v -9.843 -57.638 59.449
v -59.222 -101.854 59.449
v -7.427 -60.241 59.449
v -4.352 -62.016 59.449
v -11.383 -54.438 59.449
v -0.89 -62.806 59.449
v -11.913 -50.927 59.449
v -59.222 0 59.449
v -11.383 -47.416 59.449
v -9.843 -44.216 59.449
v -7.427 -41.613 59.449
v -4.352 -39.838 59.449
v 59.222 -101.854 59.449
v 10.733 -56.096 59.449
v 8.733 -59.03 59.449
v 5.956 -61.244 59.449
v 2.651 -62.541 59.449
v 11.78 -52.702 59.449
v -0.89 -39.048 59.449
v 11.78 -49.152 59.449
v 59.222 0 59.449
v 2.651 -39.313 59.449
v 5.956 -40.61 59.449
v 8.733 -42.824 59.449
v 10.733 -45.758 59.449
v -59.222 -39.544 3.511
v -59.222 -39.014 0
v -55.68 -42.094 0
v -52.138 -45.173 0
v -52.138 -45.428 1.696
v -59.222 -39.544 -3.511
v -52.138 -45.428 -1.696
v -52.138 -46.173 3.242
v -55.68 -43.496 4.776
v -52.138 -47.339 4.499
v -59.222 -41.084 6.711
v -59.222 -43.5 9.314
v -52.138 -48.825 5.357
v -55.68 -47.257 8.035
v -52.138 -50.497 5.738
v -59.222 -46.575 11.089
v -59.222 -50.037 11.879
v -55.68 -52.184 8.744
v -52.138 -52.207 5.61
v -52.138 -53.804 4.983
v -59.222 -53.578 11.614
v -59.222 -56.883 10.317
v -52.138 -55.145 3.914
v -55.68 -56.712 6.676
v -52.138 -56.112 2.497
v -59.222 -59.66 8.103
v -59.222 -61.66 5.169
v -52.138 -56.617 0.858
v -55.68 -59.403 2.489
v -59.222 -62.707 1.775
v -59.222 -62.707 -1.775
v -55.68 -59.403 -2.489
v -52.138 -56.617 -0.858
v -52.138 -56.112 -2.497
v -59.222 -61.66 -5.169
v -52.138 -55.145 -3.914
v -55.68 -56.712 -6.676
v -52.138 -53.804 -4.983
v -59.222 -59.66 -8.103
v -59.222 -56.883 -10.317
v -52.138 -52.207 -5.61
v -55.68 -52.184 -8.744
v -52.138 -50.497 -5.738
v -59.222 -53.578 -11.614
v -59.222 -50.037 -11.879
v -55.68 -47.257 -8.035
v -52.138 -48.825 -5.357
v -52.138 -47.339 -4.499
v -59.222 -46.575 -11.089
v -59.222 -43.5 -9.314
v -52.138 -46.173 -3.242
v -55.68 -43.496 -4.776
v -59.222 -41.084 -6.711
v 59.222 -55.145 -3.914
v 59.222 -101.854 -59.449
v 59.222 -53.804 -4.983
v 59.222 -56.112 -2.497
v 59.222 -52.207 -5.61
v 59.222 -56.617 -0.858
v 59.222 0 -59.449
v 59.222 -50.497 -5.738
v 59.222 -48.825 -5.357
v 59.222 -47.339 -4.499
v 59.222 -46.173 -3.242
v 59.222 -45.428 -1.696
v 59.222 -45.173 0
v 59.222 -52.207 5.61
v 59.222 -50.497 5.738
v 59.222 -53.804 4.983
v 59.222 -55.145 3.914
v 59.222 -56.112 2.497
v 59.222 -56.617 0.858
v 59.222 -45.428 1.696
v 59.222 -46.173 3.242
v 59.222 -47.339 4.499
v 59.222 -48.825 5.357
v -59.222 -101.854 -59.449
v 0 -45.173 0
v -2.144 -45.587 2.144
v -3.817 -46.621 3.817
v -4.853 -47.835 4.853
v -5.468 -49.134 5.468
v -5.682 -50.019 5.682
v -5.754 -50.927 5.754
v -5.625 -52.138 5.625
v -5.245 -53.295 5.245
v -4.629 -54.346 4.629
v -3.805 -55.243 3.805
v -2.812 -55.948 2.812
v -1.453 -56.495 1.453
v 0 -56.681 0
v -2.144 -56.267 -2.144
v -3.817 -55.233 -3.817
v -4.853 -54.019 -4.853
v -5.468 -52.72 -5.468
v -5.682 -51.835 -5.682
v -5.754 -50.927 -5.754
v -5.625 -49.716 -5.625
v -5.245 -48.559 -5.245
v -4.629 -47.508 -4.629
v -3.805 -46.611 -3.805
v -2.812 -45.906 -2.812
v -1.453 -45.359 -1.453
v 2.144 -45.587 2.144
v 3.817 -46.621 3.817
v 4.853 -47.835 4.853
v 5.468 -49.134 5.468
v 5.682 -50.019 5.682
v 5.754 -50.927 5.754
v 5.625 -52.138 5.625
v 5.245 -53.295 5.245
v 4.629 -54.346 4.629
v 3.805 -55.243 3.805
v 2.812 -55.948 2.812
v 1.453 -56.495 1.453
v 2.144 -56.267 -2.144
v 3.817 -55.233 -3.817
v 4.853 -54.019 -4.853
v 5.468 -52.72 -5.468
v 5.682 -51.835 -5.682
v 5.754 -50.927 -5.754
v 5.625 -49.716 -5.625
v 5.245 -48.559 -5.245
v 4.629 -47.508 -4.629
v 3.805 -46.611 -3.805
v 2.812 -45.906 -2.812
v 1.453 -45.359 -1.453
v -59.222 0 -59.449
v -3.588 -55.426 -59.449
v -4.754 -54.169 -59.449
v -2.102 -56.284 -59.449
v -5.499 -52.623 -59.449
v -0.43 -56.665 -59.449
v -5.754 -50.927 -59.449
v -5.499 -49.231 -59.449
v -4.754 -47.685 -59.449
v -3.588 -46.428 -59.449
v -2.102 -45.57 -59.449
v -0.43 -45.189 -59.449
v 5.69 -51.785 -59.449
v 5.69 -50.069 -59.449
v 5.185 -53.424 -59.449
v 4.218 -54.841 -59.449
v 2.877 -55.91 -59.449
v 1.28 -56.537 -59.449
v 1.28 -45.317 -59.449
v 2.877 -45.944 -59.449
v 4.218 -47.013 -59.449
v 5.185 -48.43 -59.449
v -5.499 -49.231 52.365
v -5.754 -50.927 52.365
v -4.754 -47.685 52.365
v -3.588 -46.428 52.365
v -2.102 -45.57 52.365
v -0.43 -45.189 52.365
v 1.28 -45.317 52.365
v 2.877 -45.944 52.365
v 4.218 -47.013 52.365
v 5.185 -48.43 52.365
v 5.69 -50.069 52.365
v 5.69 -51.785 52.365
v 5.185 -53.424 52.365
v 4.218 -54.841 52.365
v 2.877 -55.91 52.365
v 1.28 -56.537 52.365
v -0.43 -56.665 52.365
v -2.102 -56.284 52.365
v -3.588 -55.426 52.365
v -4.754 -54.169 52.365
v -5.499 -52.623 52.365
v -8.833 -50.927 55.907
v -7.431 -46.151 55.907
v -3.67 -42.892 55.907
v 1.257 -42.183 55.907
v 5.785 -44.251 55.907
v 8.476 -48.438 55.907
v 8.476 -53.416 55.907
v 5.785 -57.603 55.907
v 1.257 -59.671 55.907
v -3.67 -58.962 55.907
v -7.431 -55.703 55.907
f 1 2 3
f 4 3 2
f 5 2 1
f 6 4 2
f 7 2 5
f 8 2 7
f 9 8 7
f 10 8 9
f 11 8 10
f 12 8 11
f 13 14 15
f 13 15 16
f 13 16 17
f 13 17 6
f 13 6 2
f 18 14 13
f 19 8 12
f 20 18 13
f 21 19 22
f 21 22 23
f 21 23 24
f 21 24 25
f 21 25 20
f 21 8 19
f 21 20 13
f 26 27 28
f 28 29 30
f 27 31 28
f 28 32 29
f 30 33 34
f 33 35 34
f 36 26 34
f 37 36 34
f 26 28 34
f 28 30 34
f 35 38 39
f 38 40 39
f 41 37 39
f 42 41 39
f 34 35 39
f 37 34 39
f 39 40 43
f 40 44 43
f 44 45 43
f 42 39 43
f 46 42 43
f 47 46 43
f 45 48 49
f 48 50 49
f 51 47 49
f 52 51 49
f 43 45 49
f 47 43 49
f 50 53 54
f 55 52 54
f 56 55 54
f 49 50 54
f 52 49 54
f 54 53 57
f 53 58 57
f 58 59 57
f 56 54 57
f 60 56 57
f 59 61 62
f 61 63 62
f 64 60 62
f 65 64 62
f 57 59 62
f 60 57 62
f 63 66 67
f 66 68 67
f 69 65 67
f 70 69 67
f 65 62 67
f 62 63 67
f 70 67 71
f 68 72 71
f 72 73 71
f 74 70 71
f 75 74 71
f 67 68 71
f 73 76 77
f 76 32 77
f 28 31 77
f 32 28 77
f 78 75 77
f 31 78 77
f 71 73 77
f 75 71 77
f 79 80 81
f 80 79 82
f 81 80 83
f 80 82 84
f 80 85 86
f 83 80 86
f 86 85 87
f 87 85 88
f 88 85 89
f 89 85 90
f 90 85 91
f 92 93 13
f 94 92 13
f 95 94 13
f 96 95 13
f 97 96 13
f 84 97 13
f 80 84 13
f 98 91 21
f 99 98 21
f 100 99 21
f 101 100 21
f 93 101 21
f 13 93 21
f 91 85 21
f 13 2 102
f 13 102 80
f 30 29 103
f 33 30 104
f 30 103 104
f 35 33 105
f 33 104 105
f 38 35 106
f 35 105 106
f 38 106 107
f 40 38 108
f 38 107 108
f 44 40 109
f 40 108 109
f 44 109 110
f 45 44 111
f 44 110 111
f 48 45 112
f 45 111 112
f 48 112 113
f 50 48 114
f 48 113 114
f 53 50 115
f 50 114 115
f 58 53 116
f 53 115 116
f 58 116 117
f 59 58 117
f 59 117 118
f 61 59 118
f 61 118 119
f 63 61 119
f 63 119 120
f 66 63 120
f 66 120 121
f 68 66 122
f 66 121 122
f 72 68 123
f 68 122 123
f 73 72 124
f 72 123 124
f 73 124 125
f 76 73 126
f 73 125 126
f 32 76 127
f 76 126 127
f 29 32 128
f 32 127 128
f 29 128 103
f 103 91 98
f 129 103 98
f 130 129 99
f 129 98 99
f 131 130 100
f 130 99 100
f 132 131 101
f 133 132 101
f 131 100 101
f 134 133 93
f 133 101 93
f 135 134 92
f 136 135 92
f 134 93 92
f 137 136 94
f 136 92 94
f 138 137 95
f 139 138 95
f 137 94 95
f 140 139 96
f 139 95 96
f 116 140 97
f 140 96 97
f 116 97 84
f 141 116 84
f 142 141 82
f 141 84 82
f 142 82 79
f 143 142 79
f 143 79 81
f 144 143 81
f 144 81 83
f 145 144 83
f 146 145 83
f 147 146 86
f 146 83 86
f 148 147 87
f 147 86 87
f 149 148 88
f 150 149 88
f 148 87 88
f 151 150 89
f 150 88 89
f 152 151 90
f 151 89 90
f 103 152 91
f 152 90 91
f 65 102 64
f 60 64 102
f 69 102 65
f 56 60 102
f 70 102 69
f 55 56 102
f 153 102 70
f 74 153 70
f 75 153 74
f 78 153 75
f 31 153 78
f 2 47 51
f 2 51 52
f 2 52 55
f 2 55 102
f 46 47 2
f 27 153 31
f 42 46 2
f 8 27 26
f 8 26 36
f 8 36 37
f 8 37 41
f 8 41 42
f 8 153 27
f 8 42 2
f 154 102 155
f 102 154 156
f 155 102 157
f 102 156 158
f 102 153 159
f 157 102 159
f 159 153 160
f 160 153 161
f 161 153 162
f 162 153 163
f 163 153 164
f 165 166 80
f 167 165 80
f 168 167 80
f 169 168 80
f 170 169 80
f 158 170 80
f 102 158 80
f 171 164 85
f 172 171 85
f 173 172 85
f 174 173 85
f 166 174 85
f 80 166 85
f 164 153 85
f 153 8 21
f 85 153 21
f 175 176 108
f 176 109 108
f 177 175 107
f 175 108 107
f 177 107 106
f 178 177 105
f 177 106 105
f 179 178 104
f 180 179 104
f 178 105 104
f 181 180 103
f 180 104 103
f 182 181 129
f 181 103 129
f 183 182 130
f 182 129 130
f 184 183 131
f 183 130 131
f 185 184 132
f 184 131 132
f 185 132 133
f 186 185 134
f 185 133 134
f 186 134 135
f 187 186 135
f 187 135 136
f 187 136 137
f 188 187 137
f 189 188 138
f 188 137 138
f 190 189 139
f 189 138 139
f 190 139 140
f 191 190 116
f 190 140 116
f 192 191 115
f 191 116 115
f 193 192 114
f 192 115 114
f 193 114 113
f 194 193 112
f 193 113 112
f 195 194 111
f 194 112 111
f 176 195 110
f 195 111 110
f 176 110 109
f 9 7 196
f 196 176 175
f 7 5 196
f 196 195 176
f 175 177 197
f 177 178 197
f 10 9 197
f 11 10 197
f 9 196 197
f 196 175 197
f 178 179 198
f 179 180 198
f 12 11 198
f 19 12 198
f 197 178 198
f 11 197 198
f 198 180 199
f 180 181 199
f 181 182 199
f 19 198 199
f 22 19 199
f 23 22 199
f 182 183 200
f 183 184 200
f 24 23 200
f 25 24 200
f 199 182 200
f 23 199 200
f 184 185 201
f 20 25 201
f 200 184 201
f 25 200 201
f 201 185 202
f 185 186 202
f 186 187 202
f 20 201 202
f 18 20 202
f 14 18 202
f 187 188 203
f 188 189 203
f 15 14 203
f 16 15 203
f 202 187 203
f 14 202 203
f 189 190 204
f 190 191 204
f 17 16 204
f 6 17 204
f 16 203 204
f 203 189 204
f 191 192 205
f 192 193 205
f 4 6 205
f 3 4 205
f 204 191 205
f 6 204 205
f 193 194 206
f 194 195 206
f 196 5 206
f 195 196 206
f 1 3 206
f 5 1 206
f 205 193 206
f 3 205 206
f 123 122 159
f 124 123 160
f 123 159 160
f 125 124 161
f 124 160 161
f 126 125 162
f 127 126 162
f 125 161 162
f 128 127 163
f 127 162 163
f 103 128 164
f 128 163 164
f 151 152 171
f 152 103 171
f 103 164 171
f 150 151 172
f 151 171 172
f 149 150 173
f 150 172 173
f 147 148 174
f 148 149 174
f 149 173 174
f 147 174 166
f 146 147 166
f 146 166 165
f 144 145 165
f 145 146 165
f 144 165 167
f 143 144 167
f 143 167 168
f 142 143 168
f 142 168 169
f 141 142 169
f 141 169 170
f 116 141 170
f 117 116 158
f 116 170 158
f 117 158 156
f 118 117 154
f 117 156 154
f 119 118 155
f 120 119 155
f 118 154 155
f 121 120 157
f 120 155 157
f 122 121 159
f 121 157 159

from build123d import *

# Parameters (mm, degrees)
F0_W                 = 118.4436753392
F0_H                 = 118.8980340958
F1_DEPTH             = 101.854
F4_D                 = 11.50874
F4_CSINK_D           = 23.8252
F4_CSINK_ANGLE       = 82
F4_ON_F2_D           = 11.50874
F4_ON_F2_CSINK_D     = 23.8252
F4_ON_F2_CSINK_ANGLE = 82


with BuildPart() as f1:
    # F0 (on Front) → F1 (new body)
    with BuildSketch(Plane.XZ):
        Rectangle(F0_W, F0_H)
    extrude(amount=F1_DEPTH)

    # F4 (through all)
    with Locations(Plane(origin=(-59.2218376696, 0, 0), x_dir=(0, -1, 0), z_dir=(-1, 0, 0))):
        with Locations((50.927, 0)):
            CounterSinkHole(F4_D / 2, F4_CSINK_D / 2, counter_sink_angle=F4_CSINK_ANGLE)

    # F4 on F2 (through all)
    with Locations(Plane.XY.offset(59.4490170479)):
        with Locations((0, -50.927)):
            CounterSinkHole(F4_ON_F2_D / 2, F4_ON_F2_CSINK_D / 2, counter_sink_angle=F4_ON_F2_CSINK_ANGLE)


solid = f1.part
